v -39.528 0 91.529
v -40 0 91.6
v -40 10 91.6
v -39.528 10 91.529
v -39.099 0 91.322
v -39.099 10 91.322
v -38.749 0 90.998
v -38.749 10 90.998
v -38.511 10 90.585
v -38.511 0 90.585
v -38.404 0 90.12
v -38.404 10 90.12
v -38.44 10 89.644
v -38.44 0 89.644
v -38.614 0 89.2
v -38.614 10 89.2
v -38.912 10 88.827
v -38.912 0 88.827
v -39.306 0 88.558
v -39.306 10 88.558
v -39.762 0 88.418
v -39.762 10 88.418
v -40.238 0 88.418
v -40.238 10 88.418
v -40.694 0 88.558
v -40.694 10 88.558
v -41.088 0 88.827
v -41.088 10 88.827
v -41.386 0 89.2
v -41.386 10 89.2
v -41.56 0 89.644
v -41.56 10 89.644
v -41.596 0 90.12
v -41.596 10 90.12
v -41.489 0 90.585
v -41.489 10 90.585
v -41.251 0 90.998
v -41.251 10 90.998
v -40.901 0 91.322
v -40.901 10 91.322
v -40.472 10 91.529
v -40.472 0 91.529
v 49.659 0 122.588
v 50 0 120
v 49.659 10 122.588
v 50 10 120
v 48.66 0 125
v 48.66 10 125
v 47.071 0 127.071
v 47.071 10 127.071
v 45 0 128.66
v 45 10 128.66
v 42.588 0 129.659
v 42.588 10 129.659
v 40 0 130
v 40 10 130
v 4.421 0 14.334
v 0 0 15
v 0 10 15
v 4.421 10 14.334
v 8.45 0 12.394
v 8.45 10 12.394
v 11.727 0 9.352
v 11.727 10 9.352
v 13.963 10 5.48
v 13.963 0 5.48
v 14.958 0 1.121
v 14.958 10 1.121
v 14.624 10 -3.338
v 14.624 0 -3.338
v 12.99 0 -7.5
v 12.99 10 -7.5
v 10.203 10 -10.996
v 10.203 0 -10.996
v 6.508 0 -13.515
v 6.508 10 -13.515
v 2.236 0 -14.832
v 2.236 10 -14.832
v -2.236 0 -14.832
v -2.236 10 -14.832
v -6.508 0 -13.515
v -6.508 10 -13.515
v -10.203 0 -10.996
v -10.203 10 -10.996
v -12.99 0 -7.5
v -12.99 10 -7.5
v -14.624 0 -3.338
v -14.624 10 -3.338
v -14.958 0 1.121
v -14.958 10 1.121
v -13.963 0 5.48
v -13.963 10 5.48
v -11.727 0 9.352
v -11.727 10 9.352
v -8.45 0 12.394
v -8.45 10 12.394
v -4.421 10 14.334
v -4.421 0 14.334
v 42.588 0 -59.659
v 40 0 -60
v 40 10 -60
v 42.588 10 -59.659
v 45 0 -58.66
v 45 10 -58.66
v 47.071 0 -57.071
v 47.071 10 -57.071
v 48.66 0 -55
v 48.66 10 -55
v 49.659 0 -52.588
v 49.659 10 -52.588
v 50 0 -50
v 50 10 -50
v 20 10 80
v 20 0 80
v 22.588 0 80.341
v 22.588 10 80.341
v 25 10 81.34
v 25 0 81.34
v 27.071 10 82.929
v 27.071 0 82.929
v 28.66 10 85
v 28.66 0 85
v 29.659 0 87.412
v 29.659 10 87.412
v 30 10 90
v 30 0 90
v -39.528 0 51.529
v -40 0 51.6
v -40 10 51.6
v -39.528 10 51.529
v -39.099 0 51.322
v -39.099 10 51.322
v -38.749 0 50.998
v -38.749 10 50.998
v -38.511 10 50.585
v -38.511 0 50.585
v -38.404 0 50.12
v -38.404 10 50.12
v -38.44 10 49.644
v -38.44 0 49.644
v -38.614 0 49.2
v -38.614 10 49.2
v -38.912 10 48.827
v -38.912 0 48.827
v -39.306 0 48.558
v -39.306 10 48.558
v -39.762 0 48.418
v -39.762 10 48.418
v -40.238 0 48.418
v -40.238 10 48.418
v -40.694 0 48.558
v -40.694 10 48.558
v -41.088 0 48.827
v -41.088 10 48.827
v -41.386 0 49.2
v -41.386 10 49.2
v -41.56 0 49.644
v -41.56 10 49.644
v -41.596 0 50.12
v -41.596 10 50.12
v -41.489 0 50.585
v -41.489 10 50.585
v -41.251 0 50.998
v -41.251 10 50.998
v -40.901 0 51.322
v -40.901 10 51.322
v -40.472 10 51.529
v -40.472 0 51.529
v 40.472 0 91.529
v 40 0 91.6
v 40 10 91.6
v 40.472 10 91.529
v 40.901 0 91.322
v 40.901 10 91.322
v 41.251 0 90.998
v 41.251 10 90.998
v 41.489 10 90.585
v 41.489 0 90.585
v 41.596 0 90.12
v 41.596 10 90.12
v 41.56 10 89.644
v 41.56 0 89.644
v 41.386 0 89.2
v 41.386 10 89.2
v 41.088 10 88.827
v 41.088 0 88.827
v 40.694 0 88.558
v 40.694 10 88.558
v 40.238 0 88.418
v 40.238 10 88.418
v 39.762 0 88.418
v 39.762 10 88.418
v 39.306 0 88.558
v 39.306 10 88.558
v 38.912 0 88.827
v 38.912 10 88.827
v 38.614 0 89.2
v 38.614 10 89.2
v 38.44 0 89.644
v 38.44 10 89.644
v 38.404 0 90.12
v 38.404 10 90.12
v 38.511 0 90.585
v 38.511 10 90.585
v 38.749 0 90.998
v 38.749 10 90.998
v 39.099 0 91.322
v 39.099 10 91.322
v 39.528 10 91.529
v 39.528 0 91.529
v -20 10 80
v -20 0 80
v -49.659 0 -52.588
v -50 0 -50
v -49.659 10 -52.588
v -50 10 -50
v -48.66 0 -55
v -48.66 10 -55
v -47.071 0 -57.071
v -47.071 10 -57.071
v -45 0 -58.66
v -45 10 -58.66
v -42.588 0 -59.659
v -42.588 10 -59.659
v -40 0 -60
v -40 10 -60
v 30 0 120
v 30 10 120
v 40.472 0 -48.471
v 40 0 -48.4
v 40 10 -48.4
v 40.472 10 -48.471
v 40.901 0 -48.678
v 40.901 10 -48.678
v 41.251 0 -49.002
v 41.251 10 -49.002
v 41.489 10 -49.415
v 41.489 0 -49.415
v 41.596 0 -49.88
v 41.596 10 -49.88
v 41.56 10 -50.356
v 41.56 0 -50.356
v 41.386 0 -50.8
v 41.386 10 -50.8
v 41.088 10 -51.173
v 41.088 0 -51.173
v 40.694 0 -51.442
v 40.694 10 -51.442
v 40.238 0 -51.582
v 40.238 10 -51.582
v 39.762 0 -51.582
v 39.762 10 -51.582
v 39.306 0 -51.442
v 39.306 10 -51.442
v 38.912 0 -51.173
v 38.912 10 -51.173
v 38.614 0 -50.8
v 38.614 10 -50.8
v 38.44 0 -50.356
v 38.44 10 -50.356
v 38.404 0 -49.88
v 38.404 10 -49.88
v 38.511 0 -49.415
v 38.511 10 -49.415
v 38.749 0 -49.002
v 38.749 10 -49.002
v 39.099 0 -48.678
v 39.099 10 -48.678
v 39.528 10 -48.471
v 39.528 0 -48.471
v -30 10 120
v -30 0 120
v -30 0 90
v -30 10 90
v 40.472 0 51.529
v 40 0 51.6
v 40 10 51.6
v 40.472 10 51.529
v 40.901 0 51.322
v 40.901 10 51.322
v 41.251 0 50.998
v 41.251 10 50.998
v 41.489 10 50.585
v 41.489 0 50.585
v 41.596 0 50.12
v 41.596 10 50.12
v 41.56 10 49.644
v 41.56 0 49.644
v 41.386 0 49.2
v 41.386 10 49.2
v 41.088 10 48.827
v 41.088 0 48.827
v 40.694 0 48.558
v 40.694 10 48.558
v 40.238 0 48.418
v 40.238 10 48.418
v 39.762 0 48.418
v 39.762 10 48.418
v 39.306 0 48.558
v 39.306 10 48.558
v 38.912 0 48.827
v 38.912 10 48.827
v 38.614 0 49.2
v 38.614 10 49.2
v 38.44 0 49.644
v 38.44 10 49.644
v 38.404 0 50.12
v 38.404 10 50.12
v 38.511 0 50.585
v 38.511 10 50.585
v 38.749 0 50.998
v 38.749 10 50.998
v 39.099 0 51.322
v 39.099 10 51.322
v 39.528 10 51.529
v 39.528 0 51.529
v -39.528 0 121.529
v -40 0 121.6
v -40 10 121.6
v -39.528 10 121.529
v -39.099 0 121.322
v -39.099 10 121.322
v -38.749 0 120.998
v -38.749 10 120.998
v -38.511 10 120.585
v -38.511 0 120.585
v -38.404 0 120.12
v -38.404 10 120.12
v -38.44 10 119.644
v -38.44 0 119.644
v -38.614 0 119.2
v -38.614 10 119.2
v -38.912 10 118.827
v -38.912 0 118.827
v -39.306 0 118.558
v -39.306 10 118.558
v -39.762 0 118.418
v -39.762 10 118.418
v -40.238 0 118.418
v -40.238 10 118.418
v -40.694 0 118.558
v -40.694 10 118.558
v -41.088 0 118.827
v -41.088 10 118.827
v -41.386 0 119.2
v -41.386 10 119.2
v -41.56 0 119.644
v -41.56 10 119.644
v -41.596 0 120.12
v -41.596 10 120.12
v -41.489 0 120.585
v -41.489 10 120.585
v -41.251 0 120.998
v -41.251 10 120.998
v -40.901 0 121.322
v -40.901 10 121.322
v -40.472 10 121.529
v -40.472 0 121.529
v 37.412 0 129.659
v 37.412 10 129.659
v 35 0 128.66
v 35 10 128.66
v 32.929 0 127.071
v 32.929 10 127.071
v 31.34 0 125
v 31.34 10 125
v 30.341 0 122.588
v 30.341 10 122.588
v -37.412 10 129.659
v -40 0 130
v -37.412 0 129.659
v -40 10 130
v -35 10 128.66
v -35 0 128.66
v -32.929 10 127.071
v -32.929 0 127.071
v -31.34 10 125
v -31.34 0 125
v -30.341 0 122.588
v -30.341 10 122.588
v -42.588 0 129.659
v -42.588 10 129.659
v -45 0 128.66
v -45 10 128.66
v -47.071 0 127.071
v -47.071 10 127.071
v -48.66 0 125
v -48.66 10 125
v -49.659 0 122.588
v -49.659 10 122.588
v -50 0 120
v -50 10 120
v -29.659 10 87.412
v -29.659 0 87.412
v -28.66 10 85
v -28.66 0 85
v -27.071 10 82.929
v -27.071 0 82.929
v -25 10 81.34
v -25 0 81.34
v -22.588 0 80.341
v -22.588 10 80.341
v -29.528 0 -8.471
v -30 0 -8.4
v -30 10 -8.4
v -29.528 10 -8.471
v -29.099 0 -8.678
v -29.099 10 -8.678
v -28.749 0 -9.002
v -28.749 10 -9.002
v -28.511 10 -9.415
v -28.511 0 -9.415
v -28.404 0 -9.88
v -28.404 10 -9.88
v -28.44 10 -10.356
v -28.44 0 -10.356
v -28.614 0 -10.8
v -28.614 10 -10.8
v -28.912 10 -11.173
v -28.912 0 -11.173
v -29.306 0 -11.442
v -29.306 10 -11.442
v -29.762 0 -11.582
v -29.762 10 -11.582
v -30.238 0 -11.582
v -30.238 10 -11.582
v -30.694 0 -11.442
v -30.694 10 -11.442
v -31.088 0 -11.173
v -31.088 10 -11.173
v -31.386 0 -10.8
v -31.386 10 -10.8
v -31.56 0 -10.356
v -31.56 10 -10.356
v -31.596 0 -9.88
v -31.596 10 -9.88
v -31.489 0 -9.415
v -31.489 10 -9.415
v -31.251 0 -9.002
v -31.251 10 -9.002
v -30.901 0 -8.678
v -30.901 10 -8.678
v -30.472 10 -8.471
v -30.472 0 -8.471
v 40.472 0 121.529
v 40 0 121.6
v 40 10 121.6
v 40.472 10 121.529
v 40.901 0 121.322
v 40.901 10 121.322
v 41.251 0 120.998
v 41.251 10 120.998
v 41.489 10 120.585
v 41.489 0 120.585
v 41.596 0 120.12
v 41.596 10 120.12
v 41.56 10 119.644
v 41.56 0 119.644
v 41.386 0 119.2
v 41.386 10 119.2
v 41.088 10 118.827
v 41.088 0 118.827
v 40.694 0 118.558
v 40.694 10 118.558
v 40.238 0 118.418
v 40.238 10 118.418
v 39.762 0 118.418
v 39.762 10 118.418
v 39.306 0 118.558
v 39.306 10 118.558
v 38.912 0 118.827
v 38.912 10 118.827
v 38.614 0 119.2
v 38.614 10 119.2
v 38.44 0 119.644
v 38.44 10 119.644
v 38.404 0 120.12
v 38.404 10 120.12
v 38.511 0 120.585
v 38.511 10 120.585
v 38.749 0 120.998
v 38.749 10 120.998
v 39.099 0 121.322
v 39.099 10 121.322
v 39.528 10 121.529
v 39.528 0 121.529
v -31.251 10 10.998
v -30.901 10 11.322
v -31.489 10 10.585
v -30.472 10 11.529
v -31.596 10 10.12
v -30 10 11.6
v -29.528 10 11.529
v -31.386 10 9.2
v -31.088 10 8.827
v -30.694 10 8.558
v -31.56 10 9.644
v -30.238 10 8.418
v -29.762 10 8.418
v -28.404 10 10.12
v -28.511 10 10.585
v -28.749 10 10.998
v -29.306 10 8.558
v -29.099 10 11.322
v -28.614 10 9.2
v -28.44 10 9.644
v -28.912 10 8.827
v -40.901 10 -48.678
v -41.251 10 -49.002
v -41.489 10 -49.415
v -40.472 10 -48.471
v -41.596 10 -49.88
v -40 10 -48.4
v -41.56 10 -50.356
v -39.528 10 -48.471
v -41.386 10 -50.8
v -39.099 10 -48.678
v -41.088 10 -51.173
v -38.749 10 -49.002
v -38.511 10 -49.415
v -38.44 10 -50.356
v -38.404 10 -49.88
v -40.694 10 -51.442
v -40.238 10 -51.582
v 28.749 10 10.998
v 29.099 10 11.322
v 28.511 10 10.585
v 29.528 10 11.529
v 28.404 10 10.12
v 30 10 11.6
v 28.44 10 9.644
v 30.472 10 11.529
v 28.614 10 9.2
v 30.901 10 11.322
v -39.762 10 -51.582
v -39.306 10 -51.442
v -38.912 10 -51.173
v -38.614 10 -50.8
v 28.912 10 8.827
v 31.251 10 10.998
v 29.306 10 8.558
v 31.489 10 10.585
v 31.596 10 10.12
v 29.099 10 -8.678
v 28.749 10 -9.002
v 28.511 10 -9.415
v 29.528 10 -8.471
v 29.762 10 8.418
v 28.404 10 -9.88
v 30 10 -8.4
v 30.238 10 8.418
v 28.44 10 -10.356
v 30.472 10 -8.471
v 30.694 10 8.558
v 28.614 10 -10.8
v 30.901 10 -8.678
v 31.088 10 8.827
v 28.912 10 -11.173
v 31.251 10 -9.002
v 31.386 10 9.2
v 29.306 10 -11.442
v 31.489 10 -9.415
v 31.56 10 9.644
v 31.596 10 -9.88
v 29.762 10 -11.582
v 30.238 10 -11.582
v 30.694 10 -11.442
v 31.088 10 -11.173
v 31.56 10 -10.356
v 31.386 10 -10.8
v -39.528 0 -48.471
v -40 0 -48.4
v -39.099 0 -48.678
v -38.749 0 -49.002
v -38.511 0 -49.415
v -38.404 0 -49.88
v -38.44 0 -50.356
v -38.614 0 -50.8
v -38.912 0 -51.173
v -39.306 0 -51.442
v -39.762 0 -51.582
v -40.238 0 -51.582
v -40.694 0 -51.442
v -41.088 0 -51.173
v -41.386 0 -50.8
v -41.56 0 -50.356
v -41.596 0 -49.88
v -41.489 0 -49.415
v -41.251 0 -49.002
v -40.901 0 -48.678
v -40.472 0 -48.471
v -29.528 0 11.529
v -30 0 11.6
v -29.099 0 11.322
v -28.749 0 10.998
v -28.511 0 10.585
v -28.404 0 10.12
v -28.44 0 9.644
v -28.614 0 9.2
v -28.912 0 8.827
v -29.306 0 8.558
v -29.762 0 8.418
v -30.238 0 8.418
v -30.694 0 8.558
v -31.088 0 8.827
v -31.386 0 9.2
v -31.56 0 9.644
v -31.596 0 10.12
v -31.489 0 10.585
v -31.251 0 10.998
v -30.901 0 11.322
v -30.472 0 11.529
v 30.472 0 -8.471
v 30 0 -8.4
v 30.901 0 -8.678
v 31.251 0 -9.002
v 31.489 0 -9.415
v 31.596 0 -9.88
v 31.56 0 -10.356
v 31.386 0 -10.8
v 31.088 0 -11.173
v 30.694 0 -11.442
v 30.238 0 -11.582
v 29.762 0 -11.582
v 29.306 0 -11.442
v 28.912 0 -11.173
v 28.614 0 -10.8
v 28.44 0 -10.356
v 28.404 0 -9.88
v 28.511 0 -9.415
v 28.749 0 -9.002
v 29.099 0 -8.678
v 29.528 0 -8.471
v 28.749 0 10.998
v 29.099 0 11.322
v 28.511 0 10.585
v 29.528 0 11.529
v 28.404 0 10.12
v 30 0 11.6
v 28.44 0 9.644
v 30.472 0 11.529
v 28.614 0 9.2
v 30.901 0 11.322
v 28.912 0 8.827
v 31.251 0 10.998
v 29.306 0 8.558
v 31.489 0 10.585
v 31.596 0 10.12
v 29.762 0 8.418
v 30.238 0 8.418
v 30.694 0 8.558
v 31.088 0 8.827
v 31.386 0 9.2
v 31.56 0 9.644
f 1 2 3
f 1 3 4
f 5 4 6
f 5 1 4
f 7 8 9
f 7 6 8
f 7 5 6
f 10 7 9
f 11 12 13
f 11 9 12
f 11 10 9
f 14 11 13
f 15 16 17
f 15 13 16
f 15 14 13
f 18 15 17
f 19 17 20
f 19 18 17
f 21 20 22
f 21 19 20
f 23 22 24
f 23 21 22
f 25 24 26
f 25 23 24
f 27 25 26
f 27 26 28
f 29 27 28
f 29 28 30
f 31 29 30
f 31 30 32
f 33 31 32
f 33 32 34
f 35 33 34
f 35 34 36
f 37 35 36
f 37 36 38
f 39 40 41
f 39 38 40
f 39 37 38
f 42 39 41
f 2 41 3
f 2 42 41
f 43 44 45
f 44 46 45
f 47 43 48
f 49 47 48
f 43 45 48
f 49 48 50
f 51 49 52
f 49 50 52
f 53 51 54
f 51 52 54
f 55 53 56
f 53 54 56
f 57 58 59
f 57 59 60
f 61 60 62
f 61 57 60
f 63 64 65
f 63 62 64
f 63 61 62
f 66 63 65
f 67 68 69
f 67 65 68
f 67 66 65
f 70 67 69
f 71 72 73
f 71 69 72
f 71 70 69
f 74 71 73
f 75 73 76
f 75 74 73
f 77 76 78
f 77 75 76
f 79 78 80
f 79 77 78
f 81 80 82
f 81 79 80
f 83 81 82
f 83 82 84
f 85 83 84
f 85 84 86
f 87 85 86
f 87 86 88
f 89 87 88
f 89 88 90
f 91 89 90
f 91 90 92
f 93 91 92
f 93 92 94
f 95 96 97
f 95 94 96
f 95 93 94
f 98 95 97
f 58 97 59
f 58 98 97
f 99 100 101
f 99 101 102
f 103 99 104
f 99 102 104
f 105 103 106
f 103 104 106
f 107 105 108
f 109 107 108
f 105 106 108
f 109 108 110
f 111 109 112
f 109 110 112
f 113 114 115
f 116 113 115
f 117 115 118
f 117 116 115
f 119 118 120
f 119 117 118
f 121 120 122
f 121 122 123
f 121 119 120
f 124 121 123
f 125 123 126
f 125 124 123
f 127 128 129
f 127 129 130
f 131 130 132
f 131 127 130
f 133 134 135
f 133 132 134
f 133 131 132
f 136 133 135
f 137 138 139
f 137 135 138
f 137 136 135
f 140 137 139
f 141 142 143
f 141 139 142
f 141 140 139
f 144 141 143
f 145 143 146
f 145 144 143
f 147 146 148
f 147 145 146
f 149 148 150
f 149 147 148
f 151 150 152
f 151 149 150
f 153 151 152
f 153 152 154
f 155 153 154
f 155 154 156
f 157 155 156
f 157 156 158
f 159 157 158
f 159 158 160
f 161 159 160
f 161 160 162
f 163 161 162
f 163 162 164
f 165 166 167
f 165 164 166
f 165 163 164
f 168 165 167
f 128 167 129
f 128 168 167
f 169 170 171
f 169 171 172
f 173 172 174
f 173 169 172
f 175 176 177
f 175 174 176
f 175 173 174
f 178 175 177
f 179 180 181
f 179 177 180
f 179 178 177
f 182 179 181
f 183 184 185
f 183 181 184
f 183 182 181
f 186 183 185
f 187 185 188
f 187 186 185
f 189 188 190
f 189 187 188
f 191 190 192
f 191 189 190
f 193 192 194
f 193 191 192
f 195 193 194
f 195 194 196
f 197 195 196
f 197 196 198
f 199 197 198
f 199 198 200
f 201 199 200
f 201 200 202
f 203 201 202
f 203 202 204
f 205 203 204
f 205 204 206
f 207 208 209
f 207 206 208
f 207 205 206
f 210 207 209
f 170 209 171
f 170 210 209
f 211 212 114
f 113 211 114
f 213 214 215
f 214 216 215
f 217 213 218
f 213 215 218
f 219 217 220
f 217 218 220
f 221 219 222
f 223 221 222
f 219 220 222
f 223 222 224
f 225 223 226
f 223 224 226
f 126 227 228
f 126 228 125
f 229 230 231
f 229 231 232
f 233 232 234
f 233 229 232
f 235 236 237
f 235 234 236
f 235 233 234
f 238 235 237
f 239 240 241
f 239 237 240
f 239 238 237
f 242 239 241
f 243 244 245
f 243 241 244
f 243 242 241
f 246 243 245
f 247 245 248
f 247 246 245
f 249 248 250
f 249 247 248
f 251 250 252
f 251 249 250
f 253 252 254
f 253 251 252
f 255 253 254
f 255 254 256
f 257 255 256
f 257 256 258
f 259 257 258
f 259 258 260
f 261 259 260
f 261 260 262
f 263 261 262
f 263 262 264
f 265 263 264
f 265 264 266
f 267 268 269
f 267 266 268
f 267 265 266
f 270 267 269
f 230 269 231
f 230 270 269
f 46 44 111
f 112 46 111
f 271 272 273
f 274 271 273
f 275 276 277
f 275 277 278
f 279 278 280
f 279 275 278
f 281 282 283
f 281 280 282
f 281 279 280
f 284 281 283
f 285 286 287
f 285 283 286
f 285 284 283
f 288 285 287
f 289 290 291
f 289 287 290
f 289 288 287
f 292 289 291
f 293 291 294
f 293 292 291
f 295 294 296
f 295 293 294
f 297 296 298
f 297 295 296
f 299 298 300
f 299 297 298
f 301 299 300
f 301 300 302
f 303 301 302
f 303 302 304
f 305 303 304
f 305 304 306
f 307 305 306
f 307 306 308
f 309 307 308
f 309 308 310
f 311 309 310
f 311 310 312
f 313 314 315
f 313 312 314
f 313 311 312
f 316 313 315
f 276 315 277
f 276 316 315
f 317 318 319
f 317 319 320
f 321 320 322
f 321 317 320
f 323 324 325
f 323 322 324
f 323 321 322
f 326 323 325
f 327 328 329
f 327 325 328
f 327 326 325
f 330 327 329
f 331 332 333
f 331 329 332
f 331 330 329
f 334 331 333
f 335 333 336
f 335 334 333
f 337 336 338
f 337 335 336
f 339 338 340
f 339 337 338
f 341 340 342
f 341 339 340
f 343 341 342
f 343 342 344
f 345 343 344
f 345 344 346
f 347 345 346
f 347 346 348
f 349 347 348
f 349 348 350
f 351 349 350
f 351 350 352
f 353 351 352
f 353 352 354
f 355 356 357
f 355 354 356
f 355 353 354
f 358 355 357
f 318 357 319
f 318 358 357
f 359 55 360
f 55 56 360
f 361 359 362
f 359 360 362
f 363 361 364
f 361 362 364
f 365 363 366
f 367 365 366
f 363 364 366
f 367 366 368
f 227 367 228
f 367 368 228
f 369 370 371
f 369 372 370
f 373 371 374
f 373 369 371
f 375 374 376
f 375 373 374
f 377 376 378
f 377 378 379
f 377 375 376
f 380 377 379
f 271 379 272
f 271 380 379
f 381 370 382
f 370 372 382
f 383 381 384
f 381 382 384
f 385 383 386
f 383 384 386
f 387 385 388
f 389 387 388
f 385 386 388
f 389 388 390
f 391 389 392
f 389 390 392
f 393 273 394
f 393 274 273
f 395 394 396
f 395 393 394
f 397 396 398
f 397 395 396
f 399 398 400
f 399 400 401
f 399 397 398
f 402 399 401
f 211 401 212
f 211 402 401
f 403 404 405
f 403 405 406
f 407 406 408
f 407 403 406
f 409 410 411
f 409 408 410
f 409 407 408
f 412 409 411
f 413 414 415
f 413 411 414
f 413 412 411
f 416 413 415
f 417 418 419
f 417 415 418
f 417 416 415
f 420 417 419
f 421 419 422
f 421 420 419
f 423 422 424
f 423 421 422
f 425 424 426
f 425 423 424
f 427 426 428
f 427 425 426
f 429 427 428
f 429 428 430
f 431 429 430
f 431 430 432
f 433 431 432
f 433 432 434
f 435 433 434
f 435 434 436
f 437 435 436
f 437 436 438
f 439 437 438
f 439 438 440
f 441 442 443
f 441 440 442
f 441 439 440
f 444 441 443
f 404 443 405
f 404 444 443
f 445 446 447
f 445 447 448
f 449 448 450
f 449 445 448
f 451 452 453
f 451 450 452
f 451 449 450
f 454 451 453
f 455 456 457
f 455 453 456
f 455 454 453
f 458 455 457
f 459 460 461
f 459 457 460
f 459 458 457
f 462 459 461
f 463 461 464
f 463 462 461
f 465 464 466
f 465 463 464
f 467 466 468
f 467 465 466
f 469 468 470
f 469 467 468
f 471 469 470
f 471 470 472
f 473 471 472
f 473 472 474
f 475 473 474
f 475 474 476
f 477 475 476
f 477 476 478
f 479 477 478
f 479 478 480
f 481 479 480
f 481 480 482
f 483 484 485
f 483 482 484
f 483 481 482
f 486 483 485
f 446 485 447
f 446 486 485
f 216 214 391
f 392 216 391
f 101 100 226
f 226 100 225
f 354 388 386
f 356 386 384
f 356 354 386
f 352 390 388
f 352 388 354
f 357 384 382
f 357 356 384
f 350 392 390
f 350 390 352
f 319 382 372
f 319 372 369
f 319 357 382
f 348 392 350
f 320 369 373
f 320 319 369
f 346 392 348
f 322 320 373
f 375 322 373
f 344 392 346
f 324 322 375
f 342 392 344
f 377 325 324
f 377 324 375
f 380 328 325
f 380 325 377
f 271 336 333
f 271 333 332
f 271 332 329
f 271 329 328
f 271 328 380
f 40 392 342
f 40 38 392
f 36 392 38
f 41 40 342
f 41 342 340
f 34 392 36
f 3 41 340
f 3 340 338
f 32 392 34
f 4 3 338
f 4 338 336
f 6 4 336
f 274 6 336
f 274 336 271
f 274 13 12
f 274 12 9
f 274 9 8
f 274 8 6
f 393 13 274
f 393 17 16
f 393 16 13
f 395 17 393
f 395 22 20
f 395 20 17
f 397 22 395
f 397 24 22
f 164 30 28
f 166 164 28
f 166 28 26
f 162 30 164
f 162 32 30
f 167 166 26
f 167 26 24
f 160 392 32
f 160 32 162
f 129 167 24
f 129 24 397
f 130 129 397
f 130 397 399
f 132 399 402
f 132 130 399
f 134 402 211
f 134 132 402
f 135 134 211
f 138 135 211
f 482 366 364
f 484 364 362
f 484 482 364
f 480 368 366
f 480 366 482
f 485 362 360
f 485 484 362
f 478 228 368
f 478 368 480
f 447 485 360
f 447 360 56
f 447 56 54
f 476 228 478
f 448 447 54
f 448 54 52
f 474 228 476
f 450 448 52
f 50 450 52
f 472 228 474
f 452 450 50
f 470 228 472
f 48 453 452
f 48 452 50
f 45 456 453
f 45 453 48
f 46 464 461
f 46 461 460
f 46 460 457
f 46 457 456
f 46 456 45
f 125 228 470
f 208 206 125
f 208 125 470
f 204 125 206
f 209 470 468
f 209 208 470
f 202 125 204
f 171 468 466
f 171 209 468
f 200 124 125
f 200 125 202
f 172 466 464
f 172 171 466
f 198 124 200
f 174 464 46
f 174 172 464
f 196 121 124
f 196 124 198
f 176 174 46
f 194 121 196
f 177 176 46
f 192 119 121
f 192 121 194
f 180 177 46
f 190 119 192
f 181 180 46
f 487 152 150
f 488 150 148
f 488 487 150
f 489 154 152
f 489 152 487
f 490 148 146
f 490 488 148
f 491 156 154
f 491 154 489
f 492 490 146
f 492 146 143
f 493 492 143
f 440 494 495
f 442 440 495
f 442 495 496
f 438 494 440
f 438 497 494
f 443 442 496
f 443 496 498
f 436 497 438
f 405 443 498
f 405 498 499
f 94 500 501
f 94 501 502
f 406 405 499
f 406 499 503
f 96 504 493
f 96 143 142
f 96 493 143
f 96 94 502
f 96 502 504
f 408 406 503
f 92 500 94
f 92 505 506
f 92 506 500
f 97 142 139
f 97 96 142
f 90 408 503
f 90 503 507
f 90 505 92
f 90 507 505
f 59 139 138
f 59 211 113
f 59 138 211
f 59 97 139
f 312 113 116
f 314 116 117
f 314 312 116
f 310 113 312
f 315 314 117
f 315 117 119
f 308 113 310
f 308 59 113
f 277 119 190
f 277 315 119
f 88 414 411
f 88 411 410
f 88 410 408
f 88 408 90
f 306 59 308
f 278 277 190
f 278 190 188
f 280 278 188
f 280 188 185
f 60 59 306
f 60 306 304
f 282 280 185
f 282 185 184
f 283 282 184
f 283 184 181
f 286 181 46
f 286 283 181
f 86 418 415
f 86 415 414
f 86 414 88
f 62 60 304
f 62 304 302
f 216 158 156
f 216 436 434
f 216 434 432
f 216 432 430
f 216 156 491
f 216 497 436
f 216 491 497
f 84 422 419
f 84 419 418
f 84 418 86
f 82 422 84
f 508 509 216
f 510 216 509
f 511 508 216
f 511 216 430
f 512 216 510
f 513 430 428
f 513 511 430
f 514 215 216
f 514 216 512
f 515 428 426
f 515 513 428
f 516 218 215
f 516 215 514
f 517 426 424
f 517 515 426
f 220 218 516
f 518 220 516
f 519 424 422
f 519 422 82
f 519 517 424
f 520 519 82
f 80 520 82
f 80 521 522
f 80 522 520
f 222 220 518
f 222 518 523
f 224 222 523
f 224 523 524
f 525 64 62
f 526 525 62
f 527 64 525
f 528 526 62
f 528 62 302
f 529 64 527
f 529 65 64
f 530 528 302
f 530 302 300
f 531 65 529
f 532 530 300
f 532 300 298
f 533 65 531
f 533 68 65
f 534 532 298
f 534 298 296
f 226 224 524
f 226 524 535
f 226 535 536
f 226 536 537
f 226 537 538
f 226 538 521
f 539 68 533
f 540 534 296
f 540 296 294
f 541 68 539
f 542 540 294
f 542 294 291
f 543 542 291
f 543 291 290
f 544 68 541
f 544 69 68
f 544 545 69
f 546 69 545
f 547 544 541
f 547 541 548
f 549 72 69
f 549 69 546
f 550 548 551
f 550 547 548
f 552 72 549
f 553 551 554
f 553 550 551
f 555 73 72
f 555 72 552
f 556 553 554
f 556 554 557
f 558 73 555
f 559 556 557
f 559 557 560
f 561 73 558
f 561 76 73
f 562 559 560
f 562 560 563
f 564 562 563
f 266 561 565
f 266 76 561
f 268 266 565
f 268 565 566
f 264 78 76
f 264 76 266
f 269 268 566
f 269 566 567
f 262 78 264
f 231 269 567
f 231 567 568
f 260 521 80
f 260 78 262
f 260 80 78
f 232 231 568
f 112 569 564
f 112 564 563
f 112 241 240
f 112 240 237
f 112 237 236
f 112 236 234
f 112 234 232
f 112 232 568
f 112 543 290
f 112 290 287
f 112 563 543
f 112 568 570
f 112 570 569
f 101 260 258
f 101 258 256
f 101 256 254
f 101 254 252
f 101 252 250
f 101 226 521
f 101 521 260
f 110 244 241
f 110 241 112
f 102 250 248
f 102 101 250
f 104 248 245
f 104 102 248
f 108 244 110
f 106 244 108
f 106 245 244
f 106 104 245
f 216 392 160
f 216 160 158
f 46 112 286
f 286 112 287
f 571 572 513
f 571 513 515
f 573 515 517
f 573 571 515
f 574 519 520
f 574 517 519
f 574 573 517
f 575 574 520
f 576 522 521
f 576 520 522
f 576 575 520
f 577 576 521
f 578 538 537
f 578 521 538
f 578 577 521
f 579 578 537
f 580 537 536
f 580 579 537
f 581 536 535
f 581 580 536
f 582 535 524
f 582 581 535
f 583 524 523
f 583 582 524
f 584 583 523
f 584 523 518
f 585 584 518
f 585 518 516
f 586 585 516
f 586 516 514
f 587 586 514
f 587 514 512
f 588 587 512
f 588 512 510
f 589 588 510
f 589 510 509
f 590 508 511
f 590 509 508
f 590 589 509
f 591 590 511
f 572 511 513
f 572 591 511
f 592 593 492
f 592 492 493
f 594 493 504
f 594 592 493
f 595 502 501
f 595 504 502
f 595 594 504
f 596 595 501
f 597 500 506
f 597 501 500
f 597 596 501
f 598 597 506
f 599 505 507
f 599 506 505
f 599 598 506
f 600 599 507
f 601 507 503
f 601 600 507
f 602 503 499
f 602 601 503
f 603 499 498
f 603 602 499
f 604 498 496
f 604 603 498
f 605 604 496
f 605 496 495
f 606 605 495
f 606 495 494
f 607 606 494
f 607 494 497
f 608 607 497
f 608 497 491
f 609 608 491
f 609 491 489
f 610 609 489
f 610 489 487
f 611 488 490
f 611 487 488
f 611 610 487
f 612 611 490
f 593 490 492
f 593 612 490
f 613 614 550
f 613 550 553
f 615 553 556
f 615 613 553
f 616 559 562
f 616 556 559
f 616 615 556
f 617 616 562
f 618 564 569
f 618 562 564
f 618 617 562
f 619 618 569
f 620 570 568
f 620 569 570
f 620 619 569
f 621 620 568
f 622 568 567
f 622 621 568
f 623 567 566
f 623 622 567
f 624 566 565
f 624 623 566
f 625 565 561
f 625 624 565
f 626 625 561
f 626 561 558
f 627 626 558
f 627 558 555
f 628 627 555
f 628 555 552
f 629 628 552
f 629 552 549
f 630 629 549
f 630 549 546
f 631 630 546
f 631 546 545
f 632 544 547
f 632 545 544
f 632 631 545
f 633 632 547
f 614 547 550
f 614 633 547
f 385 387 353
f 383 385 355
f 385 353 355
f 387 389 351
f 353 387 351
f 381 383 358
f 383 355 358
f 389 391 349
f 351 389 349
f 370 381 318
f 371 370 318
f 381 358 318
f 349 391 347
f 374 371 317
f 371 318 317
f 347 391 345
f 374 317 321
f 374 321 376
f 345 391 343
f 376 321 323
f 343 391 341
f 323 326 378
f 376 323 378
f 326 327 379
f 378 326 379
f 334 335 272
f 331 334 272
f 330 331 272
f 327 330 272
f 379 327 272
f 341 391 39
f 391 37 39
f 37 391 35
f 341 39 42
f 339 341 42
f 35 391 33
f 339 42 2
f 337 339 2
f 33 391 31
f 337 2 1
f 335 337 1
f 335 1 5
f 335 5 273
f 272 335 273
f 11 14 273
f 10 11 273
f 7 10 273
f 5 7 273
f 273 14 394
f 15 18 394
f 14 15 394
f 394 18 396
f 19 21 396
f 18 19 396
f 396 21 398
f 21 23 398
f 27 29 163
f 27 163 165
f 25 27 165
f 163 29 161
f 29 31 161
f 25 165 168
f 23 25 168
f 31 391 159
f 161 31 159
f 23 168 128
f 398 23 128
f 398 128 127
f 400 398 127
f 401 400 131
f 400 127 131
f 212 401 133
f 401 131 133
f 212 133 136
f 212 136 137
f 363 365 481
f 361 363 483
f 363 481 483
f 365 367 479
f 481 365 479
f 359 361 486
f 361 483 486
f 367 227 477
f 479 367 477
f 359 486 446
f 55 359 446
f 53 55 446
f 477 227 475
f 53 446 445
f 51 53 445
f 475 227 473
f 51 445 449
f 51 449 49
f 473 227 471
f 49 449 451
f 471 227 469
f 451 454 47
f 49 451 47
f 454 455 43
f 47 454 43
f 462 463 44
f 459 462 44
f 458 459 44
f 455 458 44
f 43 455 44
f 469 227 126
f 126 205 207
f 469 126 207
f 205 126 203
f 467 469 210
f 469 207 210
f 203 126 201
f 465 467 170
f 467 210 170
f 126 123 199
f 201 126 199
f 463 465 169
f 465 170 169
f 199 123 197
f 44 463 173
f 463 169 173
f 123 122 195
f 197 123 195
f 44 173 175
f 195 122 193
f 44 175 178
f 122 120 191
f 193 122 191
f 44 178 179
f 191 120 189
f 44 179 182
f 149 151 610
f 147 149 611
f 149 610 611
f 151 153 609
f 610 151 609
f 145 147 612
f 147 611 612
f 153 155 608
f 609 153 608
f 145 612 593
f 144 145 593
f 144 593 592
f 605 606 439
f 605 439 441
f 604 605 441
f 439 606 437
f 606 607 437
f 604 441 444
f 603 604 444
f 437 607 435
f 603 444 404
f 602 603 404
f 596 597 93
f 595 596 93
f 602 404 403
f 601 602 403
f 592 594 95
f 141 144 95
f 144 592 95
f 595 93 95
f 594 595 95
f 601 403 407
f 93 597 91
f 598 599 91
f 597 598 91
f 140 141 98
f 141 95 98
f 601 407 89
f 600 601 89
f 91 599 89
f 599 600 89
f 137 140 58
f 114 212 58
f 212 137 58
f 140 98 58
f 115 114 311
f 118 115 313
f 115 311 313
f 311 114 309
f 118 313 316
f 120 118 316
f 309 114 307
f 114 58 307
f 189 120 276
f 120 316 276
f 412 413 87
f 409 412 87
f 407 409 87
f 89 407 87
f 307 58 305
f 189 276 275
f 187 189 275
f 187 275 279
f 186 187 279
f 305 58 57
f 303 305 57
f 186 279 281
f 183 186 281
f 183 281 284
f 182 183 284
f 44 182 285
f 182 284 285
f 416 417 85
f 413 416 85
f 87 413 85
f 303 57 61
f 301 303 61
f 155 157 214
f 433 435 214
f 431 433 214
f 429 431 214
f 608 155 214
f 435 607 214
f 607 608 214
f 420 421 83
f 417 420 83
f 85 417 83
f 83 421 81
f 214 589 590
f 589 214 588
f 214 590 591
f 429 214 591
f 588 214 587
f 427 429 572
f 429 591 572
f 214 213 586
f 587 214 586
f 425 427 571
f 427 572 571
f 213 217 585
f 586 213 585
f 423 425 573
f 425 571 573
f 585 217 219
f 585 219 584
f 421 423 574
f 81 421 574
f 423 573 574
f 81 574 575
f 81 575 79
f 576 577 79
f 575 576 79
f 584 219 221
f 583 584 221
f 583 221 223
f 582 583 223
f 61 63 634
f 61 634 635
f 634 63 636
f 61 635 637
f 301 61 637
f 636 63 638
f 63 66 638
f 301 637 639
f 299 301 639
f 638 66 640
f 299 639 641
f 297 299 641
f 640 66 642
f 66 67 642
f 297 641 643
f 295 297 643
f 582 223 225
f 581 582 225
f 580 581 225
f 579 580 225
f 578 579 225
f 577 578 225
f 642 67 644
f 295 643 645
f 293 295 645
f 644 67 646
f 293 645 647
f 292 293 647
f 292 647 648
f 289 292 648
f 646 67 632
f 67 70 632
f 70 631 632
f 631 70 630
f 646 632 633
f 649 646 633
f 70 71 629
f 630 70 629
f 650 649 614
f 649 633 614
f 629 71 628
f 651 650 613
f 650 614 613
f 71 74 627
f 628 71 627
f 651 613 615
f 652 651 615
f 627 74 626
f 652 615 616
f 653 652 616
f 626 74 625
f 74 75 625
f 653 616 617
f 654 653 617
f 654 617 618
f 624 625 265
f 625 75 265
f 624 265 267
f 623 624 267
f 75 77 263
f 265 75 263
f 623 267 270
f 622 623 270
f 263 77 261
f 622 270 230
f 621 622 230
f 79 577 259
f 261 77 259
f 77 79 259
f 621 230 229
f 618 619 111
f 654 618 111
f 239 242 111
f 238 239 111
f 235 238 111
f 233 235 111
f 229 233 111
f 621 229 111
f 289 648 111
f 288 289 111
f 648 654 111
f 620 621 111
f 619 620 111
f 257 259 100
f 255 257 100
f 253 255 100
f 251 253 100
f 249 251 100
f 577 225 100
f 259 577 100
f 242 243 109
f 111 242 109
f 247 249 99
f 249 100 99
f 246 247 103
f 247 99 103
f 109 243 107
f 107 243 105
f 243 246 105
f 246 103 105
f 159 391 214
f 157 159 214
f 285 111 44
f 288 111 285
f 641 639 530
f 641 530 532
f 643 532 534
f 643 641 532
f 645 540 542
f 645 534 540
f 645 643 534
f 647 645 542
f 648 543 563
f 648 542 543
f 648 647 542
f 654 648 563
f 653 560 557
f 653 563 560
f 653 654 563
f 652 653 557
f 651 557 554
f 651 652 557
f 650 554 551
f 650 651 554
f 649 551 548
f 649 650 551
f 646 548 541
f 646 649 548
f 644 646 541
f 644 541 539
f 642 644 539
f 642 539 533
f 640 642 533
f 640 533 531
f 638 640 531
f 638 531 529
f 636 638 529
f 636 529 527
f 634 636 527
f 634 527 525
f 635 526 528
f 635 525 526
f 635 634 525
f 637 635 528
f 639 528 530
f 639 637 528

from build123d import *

# Parameters (mm, degrees)
BOSS_EXTRUDE1_DEPTH     = 10
CUT_EXTRUDE1_DEPTH      = 140.642400438
CUT_EXTRUDE1_DEPTH_BACK = 140.642400438
SKETCH2_R               = 15
SKETCH2_R_2             = 1.6
CUT_EXTRUDE2_DEPTH      = 140.642400438
CUT_EXTRUDE2_DEPTH_BACK = 140.642400438
SKETCH3_W               = 60
SKETCH3_H               = 50
CUT_EXTRUDE3_DEPTH      = 140.642400438
CUT_EXTRUDE3_DEPTH_BACK = 140.642400438
SKETCH4_R               = 1.6
FILLET1_R               = 10


with BuildPart() as part:
    # Sketch1 → Boss-Extrude1 (new body)
    with BuildSketch(Plane(origin=(0, 0, 0), x_dir=(1, 0, 0), z_dir=(0, 1, 0))):
        Polygon((-50, -60), (-50, -130), (50, -130), (50, -60), (50, 60), (-50, 60), align=None)
    extrude(amount=BOSS_EXTRUDE1_DEPTH)

    # Sketch2 → Cut-Extrude1 (cut, two sides: drawn at the far end of the back side and taken through both)
    with BuildSketch(Plane(origin=(0, 10, 0), x_dir=(1, 0, 0), z_dir=(0, 1, 0)).offset(-CUT_EXTRUDE1_DEPTH_BACK)):
        with Locations(Location((0, 0, 0), (0, 0, 270))):
            Circle(SKETCH2_R)
        with Locations(Location((-40, -50, 0), (0, 0, 270))):
            Circle(SKETCH2_R_2)
        with Locations(Location((40, -50, 0), (0, 0, 270))):
            Circle(SKETCH2_R_2)
        with Locations(Location((40, 50, 0), (0, 0, 270))):
            Circle(SKETCH2_R_2)
        with Locations(Location((-40, 50, 0), (0, 0, 270))):
            Circle(SKETCH2_R_2)
        with Locations(Location((-40, -120, 0), (0, 0, 270))):
            Circle(SKETCH2_R_2)
        with Locations(Location((40, -120, 0), (0, 0, 270))):
            Circle(SKETCH2_R_2)
        with Locations(Location((-40, -90, 0), (0, 0, 270))):
            Circle(SKETCH2_R_2)
        with Locations(Location((40, -90, 0), (0, 0, 270))):
            Circle(SKETCH2_R_2)
    extrude(amount=CUT_EXTRUDE1_DEPTH + CUT_EXTRUDE1_DEPTH_BACK, mode=Mode.SUBTRACT)

    # Sketch3 → Cut-Extrude2 (cut, two sides: drawn at the far end of the back side and taken through both)
    with BuildSketch(Plane(origin=(0, 10, 0), x_dir=(1, 0, 0), z_dir=(0, 1, 0)).offset(-CUT_EXTRUDE2_DEPTH_BACK)):
        with Locations((0, -105)):
            Rectangle(SKETCH3_W, SKETCH3_H)
    extrude(amount=CUT_EXTRUDE2_DEPTH + CUT_EXTRUDE2_DEPTH_BACK, mode=Mode.SUBTRACT)

    # Sketch4 → Cut-Extrude3 (cut, two sides: drawn at the far end of the back side and taken through both)
    with BuildSketch(Plane(origin=(0, 10, 0), x_dir=(1, 0, 0), z_dir=(0, 1, 0)).offset(-CUT_EXTRUDE3_DEPTH_BACK)):
        with Locations(Location((-30, 10, 0), (0, 0, 270))):
            Circle(SKETCH4_R)
        with Locations(Location((-30, -10, 0), (0, 0, 270))):
            Circle(SKETCH4_R)
        with Locations(Location((30, 10, 0), (0, 0, 270))):
            Circle(SKETCH4_R)
        with Locations(Location((30, -10, 0), (0, 0, 270))):
            Circle(SKETCH4_R)
    extrude(amount=CUT_EXTRUDE3_DEPTH + CUT_EXTRUDE3_DEPTH_BACK, mode=Mode.SUBTRACT)

    # Fillet1
    fillet1_edges = [part.edges().sort_by_distance(p)[0] for p in [
        (50, 5, -60),
        (-50, 5, -60),
        (-50, 5, 130),
        (-30, 5, 130),
        (50, 5, 130),
        (30, 5, 130),
        (30, 5, 80),
        (-30, 5, 80),
    ]]
    fillet(fillet1_edges, radius=FILLET1_R - 0.0001)  # a hair under: the kernel refuses the full size


solid = part.part
